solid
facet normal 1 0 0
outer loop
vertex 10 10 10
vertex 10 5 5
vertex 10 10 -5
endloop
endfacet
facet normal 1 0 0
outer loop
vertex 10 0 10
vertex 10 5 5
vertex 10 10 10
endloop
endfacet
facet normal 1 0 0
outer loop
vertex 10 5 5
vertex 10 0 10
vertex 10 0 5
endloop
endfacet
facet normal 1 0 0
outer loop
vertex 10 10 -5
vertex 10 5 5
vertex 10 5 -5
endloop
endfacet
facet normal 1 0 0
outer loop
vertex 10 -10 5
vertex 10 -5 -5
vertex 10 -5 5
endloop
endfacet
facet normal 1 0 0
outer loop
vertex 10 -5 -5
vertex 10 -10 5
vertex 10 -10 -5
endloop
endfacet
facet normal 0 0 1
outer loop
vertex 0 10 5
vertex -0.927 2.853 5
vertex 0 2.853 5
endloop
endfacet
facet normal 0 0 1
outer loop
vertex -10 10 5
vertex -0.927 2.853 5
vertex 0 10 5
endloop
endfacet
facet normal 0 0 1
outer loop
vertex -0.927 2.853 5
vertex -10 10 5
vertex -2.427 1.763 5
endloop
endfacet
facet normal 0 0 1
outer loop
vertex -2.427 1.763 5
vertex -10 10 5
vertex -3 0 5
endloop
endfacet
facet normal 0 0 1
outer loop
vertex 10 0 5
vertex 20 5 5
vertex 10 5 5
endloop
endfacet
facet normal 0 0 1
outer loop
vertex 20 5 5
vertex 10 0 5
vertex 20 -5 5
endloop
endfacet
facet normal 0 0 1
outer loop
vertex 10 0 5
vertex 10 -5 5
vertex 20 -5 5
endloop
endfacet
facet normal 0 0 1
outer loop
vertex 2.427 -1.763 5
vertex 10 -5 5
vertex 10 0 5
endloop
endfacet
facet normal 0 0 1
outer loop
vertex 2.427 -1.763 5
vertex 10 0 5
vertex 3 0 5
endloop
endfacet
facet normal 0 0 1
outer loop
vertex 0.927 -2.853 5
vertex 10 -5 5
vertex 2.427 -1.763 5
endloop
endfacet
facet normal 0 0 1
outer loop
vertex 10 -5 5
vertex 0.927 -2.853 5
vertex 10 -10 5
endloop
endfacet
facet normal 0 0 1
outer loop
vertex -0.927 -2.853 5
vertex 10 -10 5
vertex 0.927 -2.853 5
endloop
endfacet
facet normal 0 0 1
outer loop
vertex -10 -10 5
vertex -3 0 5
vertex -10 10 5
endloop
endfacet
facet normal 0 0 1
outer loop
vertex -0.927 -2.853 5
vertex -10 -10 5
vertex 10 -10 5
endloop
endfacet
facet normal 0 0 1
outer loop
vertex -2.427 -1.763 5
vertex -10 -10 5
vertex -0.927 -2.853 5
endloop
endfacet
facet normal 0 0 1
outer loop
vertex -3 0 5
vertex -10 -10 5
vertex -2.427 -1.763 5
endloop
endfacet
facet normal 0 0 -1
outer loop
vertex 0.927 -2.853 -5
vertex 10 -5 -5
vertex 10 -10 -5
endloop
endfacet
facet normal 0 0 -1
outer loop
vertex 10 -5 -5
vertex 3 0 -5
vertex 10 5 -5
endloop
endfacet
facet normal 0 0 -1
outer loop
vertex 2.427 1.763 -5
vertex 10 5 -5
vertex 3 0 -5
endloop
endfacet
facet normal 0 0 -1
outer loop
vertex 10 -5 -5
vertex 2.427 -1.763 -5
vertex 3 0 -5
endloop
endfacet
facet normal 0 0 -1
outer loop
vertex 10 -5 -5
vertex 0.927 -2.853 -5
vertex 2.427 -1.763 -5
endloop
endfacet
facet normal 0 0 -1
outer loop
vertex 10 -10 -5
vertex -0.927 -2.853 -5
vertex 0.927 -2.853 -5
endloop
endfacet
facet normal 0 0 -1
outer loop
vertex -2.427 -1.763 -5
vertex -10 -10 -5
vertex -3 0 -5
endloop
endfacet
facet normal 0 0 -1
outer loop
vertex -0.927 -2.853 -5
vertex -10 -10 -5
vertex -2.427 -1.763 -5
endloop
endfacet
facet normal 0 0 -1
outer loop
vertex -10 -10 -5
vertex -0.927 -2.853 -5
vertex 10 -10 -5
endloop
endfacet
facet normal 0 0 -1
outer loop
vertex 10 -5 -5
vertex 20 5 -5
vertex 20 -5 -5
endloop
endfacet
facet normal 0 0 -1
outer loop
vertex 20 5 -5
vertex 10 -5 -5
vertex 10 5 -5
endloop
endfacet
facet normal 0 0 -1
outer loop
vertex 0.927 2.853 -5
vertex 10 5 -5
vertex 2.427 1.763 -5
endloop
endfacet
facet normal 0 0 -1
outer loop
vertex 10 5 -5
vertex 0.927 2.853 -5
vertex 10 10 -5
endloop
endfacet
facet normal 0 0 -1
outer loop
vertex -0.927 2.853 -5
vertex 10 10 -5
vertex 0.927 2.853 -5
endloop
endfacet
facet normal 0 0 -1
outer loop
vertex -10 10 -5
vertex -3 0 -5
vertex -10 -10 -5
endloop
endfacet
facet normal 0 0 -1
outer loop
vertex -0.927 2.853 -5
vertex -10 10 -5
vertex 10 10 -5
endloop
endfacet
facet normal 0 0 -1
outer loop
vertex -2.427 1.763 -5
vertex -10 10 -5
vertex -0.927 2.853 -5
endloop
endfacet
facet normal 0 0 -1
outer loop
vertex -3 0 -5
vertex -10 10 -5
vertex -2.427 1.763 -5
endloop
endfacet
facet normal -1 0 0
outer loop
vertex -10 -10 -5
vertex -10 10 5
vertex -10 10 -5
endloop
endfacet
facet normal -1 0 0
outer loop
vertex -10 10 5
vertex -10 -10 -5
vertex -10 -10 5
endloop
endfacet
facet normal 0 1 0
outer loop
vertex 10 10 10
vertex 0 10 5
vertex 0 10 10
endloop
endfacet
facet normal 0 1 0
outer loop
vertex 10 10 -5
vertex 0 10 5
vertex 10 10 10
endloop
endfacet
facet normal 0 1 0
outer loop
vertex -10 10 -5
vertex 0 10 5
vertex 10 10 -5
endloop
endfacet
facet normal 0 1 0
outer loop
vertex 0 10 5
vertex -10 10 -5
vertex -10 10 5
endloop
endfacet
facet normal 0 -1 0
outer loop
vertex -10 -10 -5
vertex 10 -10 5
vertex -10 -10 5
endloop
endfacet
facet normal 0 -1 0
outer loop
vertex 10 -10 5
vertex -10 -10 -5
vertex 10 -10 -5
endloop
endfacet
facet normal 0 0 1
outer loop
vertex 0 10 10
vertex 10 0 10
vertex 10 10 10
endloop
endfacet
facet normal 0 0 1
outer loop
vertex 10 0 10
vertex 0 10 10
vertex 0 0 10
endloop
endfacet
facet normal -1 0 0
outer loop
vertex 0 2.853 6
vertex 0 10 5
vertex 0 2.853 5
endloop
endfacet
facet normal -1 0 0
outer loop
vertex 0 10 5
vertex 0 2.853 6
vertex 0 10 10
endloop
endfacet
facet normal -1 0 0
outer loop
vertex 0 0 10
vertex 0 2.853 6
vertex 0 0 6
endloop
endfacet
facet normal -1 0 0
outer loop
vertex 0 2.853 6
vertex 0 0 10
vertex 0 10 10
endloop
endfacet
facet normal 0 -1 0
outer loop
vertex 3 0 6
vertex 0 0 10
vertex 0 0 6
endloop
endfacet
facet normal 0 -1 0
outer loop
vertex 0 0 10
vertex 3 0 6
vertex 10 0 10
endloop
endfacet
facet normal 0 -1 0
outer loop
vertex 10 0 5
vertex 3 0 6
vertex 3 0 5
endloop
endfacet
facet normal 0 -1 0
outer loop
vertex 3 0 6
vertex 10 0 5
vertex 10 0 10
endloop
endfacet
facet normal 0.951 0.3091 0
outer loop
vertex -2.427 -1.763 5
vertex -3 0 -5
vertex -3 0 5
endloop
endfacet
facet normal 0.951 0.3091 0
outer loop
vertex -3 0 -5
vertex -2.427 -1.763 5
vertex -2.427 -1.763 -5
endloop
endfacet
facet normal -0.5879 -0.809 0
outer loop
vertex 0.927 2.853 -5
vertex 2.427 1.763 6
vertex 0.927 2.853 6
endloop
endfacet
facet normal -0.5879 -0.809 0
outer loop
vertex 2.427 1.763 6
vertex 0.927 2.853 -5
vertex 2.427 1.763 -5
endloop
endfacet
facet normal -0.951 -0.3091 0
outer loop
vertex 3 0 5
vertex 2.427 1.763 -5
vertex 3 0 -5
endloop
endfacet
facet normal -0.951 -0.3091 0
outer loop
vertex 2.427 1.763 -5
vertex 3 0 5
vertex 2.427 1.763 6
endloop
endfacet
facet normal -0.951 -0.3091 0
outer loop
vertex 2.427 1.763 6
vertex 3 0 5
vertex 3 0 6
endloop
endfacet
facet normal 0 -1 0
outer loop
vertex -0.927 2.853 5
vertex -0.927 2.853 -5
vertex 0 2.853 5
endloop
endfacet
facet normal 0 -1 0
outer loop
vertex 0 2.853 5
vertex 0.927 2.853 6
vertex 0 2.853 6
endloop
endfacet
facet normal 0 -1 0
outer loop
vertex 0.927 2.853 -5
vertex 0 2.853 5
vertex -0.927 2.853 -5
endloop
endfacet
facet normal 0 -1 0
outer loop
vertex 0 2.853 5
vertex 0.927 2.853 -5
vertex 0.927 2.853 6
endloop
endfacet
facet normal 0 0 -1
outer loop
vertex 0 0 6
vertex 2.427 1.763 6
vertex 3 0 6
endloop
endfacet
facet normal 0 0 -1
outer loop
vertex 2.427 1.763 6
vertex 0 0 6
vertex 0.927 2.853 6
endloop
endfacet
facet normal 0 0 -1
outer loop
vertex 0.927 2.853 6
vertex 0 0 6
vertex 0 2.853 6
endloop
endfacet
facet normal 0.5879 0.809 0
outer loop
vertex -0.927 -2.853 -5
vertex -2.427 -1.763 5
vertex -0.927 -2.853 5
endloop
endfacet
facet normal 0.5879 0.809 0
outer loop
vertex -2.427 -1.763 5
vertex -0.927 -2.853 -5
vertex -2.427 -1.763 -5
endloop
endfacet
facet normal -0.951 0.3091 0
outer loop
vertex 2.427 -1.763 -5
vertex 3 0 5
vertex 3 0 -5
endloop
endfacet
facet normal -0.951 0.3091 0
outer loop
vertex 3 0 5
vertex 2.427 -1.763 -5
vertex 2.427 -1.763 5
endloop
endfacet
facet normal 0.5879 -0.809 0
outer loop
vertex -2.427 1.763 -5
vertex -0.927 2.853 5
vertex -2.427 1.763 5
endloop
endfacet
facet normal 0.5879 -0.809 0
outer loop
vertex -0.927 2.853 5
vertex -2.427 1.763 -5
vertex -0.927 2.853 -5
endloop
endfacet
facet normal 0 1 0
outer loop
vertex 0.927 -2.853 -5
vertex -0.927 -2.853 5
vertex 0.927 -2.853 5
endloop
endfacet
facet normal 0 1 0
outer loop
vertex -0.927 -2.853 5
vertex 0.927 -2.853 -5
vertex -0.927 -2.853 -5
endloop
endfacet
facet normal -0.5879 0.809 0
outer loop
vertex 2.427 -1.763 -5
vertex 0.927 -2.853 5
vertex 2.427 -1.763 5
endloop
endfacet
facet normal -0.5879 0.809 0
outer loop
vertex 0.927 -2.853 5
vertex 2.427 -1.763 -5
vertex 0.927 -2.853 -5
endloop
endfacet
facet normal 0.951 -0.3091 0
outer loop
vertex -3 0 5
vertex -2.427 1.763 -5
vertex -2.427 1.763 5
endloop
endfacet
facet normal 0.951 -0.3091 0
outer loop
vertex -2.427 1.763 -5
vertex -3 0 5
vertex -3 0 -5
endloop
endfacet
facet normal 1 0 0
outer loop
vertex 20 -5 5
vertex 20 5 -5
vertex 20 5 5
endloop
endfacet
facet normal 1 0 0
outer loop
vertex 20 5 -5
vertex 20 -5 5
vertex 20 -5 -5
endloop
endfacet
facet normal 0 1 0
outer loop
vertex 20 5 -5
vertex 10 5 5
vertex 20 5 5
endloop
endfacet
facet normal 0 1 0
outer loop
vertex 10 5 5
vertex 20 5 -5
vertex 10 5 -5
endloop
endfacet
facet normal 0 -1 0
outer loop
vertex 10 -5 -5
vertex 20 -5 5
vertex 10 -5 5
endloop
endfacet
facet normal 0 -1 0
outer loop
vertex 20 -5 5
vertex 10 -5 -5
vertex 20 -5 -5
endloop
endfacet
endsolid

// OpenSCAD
// minimal.scad — the .scad counterpart of bracket.csg's shape vocabulary:
// cubes, a faceted cylinder hole, and a translated foot. With openscad
// installed (`openscad -o minimal.csg minimal.scad`) this converts to the
// equivalent of bracket.csg's evaluated tree (modulo $fn resolution), so a
// binary-present smoke run can cross-check structure and volume against the
// .csg oracle. Requires the openscad binary — never executed by tests.
group() {
  difference() {
    union() {
      cube(size = [20, 20, 10], center = true);
      cube(size = [10, 10, 10], center = false);
    }
    cylinder($fn = 10, r = 3, h = 12, center = true);
  }
  multmatrix([[1, 0, 0, 15], [0, 1, 0, 0], [0, 0, 1, 0], [0, 0, 0, 1]]) {
    cube(size = [10, 10, 10], center = true);
  }
}
